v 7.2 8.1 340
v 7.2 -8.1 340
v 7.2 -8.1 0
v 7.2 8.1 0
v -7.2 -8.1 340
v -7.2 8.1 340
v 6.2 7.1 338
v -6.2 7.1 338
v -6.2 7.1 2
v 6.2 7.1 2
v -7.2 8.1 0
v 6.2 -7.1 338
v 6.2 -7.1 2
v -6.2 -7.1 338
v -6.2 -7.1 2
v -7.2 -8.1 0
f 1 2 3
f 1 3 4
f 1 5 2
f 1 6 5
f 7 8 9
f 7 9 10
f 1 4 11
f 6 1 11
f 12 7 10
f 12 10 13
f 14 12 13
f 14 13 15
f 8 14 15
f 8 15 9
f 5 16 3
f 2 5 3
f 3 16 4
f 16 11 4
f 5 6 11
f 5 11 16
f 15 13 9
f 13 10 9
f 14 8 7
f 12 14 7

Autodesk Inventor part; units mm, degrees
ref_plane "YZ Plane" through (0, 0, 0) normal (1, 0, 0) x (0, 1, 0)
ref_plane "XZ Plane" through (0, 0, 0) normal (0, 1, 0) x (-1, 0, 0)
ref_plane "XY Plane" through (0, 0, 0) normal (0, 0, 1) x (1, 0, 0)
sketch "Sketch1" plane through (0, 0, 0) normal (0, 0, 1) x (1, 0, 0)
  line L0 (-7.2, -8.1) -> (7.2, -8.1)
  line L1 (7.2, -8.1) -> (7.2, 8.1)
  line L2 (7.2, 8.1) -> (-7.2, 8.1)
  line L3 (-7.2, 8.1) -> (-7.2, -8.1)
  line L4 (-6.2, 7.1) -> (6.2, 7.1)
  line L5 (6.2, 7.1) -> (6.2, -7.1)
  line L6 (6.2, -7.1) -> (-6.2, -7.1)
  line L7 (-6.2, -7.1) -> (-6.2, 7.1)
  dimension "d9" = 1
extrude "Extrusion2" add sketch "Sketch1" along normal blind 340
sketch "Sketch2" plane through (0, 0, 340) normal (0, 0, 1) x (1, 0, 0)
  line L0 (-7.2, -8.1) -> (7.2, -8.1) construction
  line L1 (-7.2, 8.1) -> (7.2, 8.1)
  line L2 (7.2, 8.1) -> (7.2, -8.1)
  line L3 (7.2, -8.1) -> (-7.2, -8.1)
  line L4 (-7.2, -8.1) -> (-7.2, 8.1)
  point P0 (0, 0)
extrude "Extrusion3" add sketch "Sketch2" against normal blind 2
sketch "Sketch3" plane through (0, 0, 0) normal (0, 0, -1) x (-1, 0, 0)
  line L0 (-7.2, -8.1) -> (-7.2, 8.1) construction
  line L1 (7.2, 8.1) -> (7.2, -8.1) construction
  line L2 (-7.2, -8.1) -> (7.2, -8.1)
  line L3 (7.2, -8.1) -> (7.2, 8.1)
  line L4 (7.2, 8.1) -> (-7.2, 8.1)
  line L5 (-7.2, 8.1) -> (-7.2, -8.1)
  point P0 (0, 0)
extrude "Extrusion4" add sketch "Sketch3" against normal blind 2
properties part number "PL_rod_single"
